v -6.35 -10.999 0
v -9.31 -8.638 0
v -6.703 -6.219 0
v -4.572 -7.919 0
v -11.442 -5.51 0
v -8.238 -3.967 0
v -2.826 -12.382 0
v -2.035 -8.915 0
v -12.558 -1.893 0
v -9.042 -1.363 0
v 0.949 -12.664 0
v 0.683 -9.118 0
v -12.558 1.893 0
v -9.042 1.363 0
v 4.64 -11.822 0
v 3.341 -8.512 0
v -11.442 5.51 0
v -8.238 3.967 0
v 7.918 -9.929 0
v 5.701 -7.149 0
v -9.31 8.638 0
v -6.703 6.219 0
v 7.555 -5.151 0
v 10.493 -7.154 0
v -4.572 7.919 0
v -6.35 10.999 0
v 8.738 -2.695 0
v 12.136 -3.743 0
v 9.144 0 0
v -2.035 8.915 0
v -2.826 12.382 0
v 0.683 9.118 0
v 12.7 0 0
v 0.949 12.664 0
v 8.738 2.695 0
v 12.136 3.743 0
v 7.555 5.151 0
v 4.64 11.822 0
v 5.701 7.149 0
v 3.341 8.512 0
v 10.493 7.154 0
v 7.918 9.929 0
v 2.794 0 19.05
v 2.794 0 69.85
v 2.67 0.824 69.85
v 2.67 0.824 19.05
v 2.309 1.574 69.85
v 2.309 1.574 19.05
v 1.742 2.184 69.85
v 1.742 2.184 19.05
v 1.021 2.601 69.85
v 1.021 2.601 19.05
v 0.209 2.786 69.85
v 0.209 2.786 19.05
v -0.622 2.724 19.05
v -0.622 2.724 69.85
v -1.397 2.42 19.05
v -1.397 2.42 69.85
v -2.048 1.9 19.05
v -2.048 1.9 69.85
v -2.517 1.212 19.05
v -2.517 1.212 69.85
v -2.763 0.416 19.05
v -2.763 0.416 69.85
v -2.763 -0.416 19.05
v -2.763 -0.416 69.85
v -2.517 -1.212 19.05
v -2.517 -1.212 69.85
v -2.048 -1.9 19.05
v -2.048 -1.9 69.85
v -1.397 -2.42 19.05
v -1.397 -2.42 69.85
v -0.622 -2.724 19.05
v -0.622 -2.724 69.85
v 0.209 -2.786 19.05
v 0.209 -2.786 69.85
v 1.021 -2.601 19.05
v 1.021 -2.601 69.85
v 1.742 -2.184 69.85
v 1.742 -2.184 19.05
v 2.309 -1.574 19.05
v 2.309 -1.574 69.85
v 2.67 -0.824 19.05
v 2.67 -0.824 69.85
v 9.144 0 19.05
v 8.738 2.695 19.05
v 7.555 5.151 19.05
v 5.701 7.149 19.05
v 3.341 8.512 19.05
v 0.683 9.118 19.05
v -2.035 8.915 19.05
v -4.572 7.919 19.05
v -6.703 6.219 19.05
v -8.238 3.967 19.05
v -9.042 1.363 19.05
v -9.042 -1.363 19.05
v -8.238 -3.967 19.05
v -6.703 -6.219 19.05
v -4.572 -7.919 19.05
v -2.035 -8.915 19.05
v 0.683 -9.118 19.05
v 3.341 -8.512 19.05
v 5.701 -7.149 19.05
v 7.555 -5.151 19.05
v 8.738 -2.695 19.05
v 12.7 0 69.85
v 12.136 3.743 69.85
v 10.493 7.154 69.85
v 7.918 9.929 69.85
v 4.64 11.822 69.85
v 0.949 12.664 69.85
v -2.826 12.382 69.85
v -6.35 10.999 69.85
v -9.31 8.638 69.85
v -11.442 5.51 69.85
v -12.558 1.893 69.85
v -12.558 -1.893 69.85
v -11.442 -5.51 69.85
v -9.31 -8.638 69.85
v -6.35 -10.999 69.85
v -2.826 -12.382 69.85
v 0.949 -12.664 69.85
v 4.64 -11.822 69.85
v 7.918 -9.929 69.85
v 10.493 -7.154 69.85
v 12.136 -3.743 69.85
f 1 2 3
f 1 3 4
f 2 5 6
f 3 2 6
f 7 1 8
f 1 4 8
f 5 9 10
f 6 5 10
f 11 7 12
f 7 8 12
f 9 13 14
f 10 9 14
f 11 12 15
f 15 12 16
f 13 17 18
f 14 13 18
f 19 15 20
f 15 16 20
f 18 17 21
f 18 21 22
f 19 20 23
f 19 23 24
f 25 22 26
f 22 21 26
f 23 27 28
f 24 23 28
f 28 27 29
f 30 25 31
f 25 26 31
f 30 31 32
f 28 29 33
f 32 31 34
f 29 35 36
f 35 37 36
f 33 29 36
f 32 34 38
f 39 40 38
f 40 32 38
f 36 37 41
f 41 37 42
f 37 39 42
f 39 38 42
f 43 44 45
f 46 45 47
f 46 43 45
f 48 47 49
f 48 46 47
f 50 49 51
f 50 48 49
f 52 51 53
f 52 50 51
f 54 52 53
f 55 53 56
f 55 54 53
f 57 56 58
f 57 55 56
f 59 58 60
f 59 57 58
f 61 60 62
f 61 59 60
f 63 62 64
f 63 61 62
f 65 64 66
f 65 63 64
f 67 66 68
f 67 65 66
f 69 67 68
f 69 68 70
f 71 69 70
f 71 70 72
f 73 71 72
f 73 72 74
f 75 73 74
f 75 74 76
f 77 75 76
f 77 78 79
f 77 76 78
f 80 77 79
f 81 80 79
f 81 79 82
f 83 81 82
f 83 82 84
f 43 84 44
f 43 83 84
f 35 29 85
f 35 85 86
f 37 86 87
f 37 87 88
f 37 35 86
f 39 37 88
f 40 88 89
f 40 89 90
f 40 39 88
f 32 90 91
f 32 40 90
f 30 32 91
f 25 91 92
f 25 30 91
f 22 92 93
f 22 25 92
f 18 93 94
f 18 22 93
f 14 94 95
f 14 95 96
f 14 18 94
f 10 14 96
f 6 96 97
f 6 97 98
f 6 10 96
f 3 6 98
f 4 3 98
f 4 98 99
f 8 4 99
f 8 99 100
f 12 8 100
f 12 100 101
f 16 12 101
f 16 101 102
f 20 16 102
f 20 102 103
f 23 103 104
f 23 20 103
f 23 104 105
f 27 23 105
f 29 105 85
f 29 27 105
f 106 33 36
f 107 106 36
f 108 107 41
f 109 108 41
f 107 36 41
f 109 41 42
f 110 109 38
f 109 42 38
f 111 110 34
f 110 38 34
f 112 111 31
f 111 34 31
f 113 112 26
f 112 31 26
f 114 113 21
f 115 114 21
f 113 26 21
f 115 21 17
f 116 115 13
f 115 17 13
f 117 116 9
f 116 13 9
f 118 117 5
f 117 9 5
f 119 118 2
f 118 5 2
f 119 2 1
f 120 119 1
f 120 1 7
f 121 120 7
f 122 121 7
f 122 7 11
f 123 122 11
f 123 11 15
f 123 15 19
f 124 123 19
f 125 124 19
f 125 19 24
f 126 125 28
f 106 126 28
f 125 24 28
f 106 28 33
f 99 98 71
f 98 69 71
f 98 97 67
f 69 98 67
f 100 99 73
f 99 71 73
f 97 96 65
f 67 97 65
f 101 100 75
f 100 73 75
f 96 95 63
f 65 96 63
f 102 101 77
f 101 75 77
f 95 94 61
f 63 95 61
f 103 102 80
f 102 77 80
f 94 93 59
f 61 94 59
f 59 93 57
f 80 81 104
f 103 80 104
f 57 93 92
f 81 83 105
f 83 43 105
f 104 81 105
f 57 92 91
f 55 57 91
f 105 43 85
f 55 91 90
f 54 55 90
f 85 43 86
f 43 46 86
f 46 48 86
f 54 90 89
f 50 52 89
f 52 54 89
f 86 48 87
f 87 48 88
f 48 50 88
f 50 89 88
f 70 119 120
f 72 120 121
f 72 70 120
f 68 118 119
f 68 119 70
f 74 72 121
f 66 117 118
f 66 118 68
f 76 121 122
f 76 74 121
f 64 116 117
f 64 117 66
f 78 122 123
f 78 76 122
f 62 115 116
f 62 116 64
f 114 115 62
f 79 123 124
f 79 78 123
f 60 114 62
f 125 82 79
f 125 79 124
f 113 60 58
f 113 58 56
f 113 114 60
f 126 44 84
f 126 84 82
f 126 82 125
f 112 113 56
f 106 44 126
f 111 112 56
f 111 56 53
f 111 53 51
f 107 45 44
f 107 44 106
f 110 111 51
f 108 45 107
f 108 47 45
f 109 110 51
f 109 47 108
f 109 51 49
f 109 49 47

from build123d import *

# Parameters (mm, degrees)
F0_R     = 12.7
F0_R_2   = 9.144
F0_R_3   = 2.794
F1_DEPTH = 69.85
F2_DEPTH = 69.851
F3_DEPTH = 19.05


with BuildPart() as f1:
    # F0 (on Top) → F1 (new body)
    with BuildSketch(Plane.XY):
        Circle(F0_R)
        Circle(F0_R_2, mode=Mode.SUBTRACT)
        Circle(F0_R_2)
        Circle(F0_R_3, mode=Mode.SUBTRACT)
        Circle(F0_R_3)
    extrude(amount=F1_DEPTH)

    # F0 (on Top) → F2 (cut, through all)
    with BuildSketch(Plane.XY):
        Circle(F0_R_3)
    extrude(amount=F2_DEPTH, mode=Mode.SUBTRACT)

    # F0 (on Top) → F3 (cut)
    with BuildSketch(Plane.XY):
        Circle(F0_R_2)
        Circle(F0_R_3, mode=Mode.SUBTRACT)
    extrude(amount=F3_DEPTH, mode=Mode.SUBTRACT)


solid = f1.part
